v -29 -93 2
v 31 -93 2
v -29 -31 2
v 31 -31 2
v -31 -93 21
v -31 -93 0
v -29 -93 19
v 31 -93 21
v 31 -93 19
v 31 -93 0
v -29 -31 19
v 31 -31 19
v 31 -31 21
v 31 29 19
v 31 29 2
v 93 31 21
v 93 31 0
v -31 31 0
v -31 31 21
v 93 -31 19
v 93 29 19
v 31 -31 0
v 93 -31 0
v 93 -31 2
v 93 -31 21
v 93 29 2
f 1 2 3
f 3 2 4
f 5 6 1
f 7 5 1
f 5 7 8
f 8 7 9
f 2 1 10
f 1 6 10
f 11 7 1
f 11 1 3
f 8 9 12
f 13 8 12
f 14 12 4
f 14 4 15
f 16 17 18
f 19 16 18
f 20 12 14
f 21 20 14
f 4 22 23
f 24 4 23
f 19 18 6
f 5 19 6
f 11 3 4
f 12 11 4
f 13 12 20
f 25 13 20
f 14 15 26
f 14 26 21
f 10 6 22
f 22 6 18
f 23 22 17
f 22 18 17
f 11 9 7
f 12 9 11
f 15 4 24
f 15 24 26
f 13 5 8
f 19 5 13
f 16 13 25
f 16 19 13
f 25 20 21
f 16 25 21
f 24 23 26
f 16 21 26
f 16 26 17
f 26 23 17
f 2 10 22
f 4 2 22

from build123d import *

# Parameters (mm, degrees)
F0_W     = 62
F0_H     = 62
F1_DEPTH = 21
F2_W     = 62
F2_H     = 17
F3_DEPTH = 60
F4_W     = 60
F4_H     = 17
F5_DEPTH = 62


with BuildPart() as f1:
    # F0 (on Top) → F1 (new body)
    with BuildSketch(Plane.XY):
        with Locations((62, 0)):
            Rectangle(F0_W, F0_H)
        Rectangle(F0_W, F0_H)
        with Locations((0, -62)):
            Rectangle(F0_W, F0_H)
    extrude(amount=F1_DEPTH)

    # F2 (on face) → F3 (cut)
    with BuildSketch(Plane.YZ.offset(31)):
        with Locations((-62, 10.5)):
            Rectangle(F2_W, F2_H)
    extrude(amount=-F3_DEPTH, mode=Mode.SUBTRACT)

    # F4 (on face) → F5 (cut)
    with BuildSketch(Plane.YZ.offset(93)):
        with Locations((-1, 10.5)):
            Rectangle(F4_W, F4_H)
    extrude(amount=-F5_DEPTH, mode=Mode.SUBTRACT)


solid = f1.part
